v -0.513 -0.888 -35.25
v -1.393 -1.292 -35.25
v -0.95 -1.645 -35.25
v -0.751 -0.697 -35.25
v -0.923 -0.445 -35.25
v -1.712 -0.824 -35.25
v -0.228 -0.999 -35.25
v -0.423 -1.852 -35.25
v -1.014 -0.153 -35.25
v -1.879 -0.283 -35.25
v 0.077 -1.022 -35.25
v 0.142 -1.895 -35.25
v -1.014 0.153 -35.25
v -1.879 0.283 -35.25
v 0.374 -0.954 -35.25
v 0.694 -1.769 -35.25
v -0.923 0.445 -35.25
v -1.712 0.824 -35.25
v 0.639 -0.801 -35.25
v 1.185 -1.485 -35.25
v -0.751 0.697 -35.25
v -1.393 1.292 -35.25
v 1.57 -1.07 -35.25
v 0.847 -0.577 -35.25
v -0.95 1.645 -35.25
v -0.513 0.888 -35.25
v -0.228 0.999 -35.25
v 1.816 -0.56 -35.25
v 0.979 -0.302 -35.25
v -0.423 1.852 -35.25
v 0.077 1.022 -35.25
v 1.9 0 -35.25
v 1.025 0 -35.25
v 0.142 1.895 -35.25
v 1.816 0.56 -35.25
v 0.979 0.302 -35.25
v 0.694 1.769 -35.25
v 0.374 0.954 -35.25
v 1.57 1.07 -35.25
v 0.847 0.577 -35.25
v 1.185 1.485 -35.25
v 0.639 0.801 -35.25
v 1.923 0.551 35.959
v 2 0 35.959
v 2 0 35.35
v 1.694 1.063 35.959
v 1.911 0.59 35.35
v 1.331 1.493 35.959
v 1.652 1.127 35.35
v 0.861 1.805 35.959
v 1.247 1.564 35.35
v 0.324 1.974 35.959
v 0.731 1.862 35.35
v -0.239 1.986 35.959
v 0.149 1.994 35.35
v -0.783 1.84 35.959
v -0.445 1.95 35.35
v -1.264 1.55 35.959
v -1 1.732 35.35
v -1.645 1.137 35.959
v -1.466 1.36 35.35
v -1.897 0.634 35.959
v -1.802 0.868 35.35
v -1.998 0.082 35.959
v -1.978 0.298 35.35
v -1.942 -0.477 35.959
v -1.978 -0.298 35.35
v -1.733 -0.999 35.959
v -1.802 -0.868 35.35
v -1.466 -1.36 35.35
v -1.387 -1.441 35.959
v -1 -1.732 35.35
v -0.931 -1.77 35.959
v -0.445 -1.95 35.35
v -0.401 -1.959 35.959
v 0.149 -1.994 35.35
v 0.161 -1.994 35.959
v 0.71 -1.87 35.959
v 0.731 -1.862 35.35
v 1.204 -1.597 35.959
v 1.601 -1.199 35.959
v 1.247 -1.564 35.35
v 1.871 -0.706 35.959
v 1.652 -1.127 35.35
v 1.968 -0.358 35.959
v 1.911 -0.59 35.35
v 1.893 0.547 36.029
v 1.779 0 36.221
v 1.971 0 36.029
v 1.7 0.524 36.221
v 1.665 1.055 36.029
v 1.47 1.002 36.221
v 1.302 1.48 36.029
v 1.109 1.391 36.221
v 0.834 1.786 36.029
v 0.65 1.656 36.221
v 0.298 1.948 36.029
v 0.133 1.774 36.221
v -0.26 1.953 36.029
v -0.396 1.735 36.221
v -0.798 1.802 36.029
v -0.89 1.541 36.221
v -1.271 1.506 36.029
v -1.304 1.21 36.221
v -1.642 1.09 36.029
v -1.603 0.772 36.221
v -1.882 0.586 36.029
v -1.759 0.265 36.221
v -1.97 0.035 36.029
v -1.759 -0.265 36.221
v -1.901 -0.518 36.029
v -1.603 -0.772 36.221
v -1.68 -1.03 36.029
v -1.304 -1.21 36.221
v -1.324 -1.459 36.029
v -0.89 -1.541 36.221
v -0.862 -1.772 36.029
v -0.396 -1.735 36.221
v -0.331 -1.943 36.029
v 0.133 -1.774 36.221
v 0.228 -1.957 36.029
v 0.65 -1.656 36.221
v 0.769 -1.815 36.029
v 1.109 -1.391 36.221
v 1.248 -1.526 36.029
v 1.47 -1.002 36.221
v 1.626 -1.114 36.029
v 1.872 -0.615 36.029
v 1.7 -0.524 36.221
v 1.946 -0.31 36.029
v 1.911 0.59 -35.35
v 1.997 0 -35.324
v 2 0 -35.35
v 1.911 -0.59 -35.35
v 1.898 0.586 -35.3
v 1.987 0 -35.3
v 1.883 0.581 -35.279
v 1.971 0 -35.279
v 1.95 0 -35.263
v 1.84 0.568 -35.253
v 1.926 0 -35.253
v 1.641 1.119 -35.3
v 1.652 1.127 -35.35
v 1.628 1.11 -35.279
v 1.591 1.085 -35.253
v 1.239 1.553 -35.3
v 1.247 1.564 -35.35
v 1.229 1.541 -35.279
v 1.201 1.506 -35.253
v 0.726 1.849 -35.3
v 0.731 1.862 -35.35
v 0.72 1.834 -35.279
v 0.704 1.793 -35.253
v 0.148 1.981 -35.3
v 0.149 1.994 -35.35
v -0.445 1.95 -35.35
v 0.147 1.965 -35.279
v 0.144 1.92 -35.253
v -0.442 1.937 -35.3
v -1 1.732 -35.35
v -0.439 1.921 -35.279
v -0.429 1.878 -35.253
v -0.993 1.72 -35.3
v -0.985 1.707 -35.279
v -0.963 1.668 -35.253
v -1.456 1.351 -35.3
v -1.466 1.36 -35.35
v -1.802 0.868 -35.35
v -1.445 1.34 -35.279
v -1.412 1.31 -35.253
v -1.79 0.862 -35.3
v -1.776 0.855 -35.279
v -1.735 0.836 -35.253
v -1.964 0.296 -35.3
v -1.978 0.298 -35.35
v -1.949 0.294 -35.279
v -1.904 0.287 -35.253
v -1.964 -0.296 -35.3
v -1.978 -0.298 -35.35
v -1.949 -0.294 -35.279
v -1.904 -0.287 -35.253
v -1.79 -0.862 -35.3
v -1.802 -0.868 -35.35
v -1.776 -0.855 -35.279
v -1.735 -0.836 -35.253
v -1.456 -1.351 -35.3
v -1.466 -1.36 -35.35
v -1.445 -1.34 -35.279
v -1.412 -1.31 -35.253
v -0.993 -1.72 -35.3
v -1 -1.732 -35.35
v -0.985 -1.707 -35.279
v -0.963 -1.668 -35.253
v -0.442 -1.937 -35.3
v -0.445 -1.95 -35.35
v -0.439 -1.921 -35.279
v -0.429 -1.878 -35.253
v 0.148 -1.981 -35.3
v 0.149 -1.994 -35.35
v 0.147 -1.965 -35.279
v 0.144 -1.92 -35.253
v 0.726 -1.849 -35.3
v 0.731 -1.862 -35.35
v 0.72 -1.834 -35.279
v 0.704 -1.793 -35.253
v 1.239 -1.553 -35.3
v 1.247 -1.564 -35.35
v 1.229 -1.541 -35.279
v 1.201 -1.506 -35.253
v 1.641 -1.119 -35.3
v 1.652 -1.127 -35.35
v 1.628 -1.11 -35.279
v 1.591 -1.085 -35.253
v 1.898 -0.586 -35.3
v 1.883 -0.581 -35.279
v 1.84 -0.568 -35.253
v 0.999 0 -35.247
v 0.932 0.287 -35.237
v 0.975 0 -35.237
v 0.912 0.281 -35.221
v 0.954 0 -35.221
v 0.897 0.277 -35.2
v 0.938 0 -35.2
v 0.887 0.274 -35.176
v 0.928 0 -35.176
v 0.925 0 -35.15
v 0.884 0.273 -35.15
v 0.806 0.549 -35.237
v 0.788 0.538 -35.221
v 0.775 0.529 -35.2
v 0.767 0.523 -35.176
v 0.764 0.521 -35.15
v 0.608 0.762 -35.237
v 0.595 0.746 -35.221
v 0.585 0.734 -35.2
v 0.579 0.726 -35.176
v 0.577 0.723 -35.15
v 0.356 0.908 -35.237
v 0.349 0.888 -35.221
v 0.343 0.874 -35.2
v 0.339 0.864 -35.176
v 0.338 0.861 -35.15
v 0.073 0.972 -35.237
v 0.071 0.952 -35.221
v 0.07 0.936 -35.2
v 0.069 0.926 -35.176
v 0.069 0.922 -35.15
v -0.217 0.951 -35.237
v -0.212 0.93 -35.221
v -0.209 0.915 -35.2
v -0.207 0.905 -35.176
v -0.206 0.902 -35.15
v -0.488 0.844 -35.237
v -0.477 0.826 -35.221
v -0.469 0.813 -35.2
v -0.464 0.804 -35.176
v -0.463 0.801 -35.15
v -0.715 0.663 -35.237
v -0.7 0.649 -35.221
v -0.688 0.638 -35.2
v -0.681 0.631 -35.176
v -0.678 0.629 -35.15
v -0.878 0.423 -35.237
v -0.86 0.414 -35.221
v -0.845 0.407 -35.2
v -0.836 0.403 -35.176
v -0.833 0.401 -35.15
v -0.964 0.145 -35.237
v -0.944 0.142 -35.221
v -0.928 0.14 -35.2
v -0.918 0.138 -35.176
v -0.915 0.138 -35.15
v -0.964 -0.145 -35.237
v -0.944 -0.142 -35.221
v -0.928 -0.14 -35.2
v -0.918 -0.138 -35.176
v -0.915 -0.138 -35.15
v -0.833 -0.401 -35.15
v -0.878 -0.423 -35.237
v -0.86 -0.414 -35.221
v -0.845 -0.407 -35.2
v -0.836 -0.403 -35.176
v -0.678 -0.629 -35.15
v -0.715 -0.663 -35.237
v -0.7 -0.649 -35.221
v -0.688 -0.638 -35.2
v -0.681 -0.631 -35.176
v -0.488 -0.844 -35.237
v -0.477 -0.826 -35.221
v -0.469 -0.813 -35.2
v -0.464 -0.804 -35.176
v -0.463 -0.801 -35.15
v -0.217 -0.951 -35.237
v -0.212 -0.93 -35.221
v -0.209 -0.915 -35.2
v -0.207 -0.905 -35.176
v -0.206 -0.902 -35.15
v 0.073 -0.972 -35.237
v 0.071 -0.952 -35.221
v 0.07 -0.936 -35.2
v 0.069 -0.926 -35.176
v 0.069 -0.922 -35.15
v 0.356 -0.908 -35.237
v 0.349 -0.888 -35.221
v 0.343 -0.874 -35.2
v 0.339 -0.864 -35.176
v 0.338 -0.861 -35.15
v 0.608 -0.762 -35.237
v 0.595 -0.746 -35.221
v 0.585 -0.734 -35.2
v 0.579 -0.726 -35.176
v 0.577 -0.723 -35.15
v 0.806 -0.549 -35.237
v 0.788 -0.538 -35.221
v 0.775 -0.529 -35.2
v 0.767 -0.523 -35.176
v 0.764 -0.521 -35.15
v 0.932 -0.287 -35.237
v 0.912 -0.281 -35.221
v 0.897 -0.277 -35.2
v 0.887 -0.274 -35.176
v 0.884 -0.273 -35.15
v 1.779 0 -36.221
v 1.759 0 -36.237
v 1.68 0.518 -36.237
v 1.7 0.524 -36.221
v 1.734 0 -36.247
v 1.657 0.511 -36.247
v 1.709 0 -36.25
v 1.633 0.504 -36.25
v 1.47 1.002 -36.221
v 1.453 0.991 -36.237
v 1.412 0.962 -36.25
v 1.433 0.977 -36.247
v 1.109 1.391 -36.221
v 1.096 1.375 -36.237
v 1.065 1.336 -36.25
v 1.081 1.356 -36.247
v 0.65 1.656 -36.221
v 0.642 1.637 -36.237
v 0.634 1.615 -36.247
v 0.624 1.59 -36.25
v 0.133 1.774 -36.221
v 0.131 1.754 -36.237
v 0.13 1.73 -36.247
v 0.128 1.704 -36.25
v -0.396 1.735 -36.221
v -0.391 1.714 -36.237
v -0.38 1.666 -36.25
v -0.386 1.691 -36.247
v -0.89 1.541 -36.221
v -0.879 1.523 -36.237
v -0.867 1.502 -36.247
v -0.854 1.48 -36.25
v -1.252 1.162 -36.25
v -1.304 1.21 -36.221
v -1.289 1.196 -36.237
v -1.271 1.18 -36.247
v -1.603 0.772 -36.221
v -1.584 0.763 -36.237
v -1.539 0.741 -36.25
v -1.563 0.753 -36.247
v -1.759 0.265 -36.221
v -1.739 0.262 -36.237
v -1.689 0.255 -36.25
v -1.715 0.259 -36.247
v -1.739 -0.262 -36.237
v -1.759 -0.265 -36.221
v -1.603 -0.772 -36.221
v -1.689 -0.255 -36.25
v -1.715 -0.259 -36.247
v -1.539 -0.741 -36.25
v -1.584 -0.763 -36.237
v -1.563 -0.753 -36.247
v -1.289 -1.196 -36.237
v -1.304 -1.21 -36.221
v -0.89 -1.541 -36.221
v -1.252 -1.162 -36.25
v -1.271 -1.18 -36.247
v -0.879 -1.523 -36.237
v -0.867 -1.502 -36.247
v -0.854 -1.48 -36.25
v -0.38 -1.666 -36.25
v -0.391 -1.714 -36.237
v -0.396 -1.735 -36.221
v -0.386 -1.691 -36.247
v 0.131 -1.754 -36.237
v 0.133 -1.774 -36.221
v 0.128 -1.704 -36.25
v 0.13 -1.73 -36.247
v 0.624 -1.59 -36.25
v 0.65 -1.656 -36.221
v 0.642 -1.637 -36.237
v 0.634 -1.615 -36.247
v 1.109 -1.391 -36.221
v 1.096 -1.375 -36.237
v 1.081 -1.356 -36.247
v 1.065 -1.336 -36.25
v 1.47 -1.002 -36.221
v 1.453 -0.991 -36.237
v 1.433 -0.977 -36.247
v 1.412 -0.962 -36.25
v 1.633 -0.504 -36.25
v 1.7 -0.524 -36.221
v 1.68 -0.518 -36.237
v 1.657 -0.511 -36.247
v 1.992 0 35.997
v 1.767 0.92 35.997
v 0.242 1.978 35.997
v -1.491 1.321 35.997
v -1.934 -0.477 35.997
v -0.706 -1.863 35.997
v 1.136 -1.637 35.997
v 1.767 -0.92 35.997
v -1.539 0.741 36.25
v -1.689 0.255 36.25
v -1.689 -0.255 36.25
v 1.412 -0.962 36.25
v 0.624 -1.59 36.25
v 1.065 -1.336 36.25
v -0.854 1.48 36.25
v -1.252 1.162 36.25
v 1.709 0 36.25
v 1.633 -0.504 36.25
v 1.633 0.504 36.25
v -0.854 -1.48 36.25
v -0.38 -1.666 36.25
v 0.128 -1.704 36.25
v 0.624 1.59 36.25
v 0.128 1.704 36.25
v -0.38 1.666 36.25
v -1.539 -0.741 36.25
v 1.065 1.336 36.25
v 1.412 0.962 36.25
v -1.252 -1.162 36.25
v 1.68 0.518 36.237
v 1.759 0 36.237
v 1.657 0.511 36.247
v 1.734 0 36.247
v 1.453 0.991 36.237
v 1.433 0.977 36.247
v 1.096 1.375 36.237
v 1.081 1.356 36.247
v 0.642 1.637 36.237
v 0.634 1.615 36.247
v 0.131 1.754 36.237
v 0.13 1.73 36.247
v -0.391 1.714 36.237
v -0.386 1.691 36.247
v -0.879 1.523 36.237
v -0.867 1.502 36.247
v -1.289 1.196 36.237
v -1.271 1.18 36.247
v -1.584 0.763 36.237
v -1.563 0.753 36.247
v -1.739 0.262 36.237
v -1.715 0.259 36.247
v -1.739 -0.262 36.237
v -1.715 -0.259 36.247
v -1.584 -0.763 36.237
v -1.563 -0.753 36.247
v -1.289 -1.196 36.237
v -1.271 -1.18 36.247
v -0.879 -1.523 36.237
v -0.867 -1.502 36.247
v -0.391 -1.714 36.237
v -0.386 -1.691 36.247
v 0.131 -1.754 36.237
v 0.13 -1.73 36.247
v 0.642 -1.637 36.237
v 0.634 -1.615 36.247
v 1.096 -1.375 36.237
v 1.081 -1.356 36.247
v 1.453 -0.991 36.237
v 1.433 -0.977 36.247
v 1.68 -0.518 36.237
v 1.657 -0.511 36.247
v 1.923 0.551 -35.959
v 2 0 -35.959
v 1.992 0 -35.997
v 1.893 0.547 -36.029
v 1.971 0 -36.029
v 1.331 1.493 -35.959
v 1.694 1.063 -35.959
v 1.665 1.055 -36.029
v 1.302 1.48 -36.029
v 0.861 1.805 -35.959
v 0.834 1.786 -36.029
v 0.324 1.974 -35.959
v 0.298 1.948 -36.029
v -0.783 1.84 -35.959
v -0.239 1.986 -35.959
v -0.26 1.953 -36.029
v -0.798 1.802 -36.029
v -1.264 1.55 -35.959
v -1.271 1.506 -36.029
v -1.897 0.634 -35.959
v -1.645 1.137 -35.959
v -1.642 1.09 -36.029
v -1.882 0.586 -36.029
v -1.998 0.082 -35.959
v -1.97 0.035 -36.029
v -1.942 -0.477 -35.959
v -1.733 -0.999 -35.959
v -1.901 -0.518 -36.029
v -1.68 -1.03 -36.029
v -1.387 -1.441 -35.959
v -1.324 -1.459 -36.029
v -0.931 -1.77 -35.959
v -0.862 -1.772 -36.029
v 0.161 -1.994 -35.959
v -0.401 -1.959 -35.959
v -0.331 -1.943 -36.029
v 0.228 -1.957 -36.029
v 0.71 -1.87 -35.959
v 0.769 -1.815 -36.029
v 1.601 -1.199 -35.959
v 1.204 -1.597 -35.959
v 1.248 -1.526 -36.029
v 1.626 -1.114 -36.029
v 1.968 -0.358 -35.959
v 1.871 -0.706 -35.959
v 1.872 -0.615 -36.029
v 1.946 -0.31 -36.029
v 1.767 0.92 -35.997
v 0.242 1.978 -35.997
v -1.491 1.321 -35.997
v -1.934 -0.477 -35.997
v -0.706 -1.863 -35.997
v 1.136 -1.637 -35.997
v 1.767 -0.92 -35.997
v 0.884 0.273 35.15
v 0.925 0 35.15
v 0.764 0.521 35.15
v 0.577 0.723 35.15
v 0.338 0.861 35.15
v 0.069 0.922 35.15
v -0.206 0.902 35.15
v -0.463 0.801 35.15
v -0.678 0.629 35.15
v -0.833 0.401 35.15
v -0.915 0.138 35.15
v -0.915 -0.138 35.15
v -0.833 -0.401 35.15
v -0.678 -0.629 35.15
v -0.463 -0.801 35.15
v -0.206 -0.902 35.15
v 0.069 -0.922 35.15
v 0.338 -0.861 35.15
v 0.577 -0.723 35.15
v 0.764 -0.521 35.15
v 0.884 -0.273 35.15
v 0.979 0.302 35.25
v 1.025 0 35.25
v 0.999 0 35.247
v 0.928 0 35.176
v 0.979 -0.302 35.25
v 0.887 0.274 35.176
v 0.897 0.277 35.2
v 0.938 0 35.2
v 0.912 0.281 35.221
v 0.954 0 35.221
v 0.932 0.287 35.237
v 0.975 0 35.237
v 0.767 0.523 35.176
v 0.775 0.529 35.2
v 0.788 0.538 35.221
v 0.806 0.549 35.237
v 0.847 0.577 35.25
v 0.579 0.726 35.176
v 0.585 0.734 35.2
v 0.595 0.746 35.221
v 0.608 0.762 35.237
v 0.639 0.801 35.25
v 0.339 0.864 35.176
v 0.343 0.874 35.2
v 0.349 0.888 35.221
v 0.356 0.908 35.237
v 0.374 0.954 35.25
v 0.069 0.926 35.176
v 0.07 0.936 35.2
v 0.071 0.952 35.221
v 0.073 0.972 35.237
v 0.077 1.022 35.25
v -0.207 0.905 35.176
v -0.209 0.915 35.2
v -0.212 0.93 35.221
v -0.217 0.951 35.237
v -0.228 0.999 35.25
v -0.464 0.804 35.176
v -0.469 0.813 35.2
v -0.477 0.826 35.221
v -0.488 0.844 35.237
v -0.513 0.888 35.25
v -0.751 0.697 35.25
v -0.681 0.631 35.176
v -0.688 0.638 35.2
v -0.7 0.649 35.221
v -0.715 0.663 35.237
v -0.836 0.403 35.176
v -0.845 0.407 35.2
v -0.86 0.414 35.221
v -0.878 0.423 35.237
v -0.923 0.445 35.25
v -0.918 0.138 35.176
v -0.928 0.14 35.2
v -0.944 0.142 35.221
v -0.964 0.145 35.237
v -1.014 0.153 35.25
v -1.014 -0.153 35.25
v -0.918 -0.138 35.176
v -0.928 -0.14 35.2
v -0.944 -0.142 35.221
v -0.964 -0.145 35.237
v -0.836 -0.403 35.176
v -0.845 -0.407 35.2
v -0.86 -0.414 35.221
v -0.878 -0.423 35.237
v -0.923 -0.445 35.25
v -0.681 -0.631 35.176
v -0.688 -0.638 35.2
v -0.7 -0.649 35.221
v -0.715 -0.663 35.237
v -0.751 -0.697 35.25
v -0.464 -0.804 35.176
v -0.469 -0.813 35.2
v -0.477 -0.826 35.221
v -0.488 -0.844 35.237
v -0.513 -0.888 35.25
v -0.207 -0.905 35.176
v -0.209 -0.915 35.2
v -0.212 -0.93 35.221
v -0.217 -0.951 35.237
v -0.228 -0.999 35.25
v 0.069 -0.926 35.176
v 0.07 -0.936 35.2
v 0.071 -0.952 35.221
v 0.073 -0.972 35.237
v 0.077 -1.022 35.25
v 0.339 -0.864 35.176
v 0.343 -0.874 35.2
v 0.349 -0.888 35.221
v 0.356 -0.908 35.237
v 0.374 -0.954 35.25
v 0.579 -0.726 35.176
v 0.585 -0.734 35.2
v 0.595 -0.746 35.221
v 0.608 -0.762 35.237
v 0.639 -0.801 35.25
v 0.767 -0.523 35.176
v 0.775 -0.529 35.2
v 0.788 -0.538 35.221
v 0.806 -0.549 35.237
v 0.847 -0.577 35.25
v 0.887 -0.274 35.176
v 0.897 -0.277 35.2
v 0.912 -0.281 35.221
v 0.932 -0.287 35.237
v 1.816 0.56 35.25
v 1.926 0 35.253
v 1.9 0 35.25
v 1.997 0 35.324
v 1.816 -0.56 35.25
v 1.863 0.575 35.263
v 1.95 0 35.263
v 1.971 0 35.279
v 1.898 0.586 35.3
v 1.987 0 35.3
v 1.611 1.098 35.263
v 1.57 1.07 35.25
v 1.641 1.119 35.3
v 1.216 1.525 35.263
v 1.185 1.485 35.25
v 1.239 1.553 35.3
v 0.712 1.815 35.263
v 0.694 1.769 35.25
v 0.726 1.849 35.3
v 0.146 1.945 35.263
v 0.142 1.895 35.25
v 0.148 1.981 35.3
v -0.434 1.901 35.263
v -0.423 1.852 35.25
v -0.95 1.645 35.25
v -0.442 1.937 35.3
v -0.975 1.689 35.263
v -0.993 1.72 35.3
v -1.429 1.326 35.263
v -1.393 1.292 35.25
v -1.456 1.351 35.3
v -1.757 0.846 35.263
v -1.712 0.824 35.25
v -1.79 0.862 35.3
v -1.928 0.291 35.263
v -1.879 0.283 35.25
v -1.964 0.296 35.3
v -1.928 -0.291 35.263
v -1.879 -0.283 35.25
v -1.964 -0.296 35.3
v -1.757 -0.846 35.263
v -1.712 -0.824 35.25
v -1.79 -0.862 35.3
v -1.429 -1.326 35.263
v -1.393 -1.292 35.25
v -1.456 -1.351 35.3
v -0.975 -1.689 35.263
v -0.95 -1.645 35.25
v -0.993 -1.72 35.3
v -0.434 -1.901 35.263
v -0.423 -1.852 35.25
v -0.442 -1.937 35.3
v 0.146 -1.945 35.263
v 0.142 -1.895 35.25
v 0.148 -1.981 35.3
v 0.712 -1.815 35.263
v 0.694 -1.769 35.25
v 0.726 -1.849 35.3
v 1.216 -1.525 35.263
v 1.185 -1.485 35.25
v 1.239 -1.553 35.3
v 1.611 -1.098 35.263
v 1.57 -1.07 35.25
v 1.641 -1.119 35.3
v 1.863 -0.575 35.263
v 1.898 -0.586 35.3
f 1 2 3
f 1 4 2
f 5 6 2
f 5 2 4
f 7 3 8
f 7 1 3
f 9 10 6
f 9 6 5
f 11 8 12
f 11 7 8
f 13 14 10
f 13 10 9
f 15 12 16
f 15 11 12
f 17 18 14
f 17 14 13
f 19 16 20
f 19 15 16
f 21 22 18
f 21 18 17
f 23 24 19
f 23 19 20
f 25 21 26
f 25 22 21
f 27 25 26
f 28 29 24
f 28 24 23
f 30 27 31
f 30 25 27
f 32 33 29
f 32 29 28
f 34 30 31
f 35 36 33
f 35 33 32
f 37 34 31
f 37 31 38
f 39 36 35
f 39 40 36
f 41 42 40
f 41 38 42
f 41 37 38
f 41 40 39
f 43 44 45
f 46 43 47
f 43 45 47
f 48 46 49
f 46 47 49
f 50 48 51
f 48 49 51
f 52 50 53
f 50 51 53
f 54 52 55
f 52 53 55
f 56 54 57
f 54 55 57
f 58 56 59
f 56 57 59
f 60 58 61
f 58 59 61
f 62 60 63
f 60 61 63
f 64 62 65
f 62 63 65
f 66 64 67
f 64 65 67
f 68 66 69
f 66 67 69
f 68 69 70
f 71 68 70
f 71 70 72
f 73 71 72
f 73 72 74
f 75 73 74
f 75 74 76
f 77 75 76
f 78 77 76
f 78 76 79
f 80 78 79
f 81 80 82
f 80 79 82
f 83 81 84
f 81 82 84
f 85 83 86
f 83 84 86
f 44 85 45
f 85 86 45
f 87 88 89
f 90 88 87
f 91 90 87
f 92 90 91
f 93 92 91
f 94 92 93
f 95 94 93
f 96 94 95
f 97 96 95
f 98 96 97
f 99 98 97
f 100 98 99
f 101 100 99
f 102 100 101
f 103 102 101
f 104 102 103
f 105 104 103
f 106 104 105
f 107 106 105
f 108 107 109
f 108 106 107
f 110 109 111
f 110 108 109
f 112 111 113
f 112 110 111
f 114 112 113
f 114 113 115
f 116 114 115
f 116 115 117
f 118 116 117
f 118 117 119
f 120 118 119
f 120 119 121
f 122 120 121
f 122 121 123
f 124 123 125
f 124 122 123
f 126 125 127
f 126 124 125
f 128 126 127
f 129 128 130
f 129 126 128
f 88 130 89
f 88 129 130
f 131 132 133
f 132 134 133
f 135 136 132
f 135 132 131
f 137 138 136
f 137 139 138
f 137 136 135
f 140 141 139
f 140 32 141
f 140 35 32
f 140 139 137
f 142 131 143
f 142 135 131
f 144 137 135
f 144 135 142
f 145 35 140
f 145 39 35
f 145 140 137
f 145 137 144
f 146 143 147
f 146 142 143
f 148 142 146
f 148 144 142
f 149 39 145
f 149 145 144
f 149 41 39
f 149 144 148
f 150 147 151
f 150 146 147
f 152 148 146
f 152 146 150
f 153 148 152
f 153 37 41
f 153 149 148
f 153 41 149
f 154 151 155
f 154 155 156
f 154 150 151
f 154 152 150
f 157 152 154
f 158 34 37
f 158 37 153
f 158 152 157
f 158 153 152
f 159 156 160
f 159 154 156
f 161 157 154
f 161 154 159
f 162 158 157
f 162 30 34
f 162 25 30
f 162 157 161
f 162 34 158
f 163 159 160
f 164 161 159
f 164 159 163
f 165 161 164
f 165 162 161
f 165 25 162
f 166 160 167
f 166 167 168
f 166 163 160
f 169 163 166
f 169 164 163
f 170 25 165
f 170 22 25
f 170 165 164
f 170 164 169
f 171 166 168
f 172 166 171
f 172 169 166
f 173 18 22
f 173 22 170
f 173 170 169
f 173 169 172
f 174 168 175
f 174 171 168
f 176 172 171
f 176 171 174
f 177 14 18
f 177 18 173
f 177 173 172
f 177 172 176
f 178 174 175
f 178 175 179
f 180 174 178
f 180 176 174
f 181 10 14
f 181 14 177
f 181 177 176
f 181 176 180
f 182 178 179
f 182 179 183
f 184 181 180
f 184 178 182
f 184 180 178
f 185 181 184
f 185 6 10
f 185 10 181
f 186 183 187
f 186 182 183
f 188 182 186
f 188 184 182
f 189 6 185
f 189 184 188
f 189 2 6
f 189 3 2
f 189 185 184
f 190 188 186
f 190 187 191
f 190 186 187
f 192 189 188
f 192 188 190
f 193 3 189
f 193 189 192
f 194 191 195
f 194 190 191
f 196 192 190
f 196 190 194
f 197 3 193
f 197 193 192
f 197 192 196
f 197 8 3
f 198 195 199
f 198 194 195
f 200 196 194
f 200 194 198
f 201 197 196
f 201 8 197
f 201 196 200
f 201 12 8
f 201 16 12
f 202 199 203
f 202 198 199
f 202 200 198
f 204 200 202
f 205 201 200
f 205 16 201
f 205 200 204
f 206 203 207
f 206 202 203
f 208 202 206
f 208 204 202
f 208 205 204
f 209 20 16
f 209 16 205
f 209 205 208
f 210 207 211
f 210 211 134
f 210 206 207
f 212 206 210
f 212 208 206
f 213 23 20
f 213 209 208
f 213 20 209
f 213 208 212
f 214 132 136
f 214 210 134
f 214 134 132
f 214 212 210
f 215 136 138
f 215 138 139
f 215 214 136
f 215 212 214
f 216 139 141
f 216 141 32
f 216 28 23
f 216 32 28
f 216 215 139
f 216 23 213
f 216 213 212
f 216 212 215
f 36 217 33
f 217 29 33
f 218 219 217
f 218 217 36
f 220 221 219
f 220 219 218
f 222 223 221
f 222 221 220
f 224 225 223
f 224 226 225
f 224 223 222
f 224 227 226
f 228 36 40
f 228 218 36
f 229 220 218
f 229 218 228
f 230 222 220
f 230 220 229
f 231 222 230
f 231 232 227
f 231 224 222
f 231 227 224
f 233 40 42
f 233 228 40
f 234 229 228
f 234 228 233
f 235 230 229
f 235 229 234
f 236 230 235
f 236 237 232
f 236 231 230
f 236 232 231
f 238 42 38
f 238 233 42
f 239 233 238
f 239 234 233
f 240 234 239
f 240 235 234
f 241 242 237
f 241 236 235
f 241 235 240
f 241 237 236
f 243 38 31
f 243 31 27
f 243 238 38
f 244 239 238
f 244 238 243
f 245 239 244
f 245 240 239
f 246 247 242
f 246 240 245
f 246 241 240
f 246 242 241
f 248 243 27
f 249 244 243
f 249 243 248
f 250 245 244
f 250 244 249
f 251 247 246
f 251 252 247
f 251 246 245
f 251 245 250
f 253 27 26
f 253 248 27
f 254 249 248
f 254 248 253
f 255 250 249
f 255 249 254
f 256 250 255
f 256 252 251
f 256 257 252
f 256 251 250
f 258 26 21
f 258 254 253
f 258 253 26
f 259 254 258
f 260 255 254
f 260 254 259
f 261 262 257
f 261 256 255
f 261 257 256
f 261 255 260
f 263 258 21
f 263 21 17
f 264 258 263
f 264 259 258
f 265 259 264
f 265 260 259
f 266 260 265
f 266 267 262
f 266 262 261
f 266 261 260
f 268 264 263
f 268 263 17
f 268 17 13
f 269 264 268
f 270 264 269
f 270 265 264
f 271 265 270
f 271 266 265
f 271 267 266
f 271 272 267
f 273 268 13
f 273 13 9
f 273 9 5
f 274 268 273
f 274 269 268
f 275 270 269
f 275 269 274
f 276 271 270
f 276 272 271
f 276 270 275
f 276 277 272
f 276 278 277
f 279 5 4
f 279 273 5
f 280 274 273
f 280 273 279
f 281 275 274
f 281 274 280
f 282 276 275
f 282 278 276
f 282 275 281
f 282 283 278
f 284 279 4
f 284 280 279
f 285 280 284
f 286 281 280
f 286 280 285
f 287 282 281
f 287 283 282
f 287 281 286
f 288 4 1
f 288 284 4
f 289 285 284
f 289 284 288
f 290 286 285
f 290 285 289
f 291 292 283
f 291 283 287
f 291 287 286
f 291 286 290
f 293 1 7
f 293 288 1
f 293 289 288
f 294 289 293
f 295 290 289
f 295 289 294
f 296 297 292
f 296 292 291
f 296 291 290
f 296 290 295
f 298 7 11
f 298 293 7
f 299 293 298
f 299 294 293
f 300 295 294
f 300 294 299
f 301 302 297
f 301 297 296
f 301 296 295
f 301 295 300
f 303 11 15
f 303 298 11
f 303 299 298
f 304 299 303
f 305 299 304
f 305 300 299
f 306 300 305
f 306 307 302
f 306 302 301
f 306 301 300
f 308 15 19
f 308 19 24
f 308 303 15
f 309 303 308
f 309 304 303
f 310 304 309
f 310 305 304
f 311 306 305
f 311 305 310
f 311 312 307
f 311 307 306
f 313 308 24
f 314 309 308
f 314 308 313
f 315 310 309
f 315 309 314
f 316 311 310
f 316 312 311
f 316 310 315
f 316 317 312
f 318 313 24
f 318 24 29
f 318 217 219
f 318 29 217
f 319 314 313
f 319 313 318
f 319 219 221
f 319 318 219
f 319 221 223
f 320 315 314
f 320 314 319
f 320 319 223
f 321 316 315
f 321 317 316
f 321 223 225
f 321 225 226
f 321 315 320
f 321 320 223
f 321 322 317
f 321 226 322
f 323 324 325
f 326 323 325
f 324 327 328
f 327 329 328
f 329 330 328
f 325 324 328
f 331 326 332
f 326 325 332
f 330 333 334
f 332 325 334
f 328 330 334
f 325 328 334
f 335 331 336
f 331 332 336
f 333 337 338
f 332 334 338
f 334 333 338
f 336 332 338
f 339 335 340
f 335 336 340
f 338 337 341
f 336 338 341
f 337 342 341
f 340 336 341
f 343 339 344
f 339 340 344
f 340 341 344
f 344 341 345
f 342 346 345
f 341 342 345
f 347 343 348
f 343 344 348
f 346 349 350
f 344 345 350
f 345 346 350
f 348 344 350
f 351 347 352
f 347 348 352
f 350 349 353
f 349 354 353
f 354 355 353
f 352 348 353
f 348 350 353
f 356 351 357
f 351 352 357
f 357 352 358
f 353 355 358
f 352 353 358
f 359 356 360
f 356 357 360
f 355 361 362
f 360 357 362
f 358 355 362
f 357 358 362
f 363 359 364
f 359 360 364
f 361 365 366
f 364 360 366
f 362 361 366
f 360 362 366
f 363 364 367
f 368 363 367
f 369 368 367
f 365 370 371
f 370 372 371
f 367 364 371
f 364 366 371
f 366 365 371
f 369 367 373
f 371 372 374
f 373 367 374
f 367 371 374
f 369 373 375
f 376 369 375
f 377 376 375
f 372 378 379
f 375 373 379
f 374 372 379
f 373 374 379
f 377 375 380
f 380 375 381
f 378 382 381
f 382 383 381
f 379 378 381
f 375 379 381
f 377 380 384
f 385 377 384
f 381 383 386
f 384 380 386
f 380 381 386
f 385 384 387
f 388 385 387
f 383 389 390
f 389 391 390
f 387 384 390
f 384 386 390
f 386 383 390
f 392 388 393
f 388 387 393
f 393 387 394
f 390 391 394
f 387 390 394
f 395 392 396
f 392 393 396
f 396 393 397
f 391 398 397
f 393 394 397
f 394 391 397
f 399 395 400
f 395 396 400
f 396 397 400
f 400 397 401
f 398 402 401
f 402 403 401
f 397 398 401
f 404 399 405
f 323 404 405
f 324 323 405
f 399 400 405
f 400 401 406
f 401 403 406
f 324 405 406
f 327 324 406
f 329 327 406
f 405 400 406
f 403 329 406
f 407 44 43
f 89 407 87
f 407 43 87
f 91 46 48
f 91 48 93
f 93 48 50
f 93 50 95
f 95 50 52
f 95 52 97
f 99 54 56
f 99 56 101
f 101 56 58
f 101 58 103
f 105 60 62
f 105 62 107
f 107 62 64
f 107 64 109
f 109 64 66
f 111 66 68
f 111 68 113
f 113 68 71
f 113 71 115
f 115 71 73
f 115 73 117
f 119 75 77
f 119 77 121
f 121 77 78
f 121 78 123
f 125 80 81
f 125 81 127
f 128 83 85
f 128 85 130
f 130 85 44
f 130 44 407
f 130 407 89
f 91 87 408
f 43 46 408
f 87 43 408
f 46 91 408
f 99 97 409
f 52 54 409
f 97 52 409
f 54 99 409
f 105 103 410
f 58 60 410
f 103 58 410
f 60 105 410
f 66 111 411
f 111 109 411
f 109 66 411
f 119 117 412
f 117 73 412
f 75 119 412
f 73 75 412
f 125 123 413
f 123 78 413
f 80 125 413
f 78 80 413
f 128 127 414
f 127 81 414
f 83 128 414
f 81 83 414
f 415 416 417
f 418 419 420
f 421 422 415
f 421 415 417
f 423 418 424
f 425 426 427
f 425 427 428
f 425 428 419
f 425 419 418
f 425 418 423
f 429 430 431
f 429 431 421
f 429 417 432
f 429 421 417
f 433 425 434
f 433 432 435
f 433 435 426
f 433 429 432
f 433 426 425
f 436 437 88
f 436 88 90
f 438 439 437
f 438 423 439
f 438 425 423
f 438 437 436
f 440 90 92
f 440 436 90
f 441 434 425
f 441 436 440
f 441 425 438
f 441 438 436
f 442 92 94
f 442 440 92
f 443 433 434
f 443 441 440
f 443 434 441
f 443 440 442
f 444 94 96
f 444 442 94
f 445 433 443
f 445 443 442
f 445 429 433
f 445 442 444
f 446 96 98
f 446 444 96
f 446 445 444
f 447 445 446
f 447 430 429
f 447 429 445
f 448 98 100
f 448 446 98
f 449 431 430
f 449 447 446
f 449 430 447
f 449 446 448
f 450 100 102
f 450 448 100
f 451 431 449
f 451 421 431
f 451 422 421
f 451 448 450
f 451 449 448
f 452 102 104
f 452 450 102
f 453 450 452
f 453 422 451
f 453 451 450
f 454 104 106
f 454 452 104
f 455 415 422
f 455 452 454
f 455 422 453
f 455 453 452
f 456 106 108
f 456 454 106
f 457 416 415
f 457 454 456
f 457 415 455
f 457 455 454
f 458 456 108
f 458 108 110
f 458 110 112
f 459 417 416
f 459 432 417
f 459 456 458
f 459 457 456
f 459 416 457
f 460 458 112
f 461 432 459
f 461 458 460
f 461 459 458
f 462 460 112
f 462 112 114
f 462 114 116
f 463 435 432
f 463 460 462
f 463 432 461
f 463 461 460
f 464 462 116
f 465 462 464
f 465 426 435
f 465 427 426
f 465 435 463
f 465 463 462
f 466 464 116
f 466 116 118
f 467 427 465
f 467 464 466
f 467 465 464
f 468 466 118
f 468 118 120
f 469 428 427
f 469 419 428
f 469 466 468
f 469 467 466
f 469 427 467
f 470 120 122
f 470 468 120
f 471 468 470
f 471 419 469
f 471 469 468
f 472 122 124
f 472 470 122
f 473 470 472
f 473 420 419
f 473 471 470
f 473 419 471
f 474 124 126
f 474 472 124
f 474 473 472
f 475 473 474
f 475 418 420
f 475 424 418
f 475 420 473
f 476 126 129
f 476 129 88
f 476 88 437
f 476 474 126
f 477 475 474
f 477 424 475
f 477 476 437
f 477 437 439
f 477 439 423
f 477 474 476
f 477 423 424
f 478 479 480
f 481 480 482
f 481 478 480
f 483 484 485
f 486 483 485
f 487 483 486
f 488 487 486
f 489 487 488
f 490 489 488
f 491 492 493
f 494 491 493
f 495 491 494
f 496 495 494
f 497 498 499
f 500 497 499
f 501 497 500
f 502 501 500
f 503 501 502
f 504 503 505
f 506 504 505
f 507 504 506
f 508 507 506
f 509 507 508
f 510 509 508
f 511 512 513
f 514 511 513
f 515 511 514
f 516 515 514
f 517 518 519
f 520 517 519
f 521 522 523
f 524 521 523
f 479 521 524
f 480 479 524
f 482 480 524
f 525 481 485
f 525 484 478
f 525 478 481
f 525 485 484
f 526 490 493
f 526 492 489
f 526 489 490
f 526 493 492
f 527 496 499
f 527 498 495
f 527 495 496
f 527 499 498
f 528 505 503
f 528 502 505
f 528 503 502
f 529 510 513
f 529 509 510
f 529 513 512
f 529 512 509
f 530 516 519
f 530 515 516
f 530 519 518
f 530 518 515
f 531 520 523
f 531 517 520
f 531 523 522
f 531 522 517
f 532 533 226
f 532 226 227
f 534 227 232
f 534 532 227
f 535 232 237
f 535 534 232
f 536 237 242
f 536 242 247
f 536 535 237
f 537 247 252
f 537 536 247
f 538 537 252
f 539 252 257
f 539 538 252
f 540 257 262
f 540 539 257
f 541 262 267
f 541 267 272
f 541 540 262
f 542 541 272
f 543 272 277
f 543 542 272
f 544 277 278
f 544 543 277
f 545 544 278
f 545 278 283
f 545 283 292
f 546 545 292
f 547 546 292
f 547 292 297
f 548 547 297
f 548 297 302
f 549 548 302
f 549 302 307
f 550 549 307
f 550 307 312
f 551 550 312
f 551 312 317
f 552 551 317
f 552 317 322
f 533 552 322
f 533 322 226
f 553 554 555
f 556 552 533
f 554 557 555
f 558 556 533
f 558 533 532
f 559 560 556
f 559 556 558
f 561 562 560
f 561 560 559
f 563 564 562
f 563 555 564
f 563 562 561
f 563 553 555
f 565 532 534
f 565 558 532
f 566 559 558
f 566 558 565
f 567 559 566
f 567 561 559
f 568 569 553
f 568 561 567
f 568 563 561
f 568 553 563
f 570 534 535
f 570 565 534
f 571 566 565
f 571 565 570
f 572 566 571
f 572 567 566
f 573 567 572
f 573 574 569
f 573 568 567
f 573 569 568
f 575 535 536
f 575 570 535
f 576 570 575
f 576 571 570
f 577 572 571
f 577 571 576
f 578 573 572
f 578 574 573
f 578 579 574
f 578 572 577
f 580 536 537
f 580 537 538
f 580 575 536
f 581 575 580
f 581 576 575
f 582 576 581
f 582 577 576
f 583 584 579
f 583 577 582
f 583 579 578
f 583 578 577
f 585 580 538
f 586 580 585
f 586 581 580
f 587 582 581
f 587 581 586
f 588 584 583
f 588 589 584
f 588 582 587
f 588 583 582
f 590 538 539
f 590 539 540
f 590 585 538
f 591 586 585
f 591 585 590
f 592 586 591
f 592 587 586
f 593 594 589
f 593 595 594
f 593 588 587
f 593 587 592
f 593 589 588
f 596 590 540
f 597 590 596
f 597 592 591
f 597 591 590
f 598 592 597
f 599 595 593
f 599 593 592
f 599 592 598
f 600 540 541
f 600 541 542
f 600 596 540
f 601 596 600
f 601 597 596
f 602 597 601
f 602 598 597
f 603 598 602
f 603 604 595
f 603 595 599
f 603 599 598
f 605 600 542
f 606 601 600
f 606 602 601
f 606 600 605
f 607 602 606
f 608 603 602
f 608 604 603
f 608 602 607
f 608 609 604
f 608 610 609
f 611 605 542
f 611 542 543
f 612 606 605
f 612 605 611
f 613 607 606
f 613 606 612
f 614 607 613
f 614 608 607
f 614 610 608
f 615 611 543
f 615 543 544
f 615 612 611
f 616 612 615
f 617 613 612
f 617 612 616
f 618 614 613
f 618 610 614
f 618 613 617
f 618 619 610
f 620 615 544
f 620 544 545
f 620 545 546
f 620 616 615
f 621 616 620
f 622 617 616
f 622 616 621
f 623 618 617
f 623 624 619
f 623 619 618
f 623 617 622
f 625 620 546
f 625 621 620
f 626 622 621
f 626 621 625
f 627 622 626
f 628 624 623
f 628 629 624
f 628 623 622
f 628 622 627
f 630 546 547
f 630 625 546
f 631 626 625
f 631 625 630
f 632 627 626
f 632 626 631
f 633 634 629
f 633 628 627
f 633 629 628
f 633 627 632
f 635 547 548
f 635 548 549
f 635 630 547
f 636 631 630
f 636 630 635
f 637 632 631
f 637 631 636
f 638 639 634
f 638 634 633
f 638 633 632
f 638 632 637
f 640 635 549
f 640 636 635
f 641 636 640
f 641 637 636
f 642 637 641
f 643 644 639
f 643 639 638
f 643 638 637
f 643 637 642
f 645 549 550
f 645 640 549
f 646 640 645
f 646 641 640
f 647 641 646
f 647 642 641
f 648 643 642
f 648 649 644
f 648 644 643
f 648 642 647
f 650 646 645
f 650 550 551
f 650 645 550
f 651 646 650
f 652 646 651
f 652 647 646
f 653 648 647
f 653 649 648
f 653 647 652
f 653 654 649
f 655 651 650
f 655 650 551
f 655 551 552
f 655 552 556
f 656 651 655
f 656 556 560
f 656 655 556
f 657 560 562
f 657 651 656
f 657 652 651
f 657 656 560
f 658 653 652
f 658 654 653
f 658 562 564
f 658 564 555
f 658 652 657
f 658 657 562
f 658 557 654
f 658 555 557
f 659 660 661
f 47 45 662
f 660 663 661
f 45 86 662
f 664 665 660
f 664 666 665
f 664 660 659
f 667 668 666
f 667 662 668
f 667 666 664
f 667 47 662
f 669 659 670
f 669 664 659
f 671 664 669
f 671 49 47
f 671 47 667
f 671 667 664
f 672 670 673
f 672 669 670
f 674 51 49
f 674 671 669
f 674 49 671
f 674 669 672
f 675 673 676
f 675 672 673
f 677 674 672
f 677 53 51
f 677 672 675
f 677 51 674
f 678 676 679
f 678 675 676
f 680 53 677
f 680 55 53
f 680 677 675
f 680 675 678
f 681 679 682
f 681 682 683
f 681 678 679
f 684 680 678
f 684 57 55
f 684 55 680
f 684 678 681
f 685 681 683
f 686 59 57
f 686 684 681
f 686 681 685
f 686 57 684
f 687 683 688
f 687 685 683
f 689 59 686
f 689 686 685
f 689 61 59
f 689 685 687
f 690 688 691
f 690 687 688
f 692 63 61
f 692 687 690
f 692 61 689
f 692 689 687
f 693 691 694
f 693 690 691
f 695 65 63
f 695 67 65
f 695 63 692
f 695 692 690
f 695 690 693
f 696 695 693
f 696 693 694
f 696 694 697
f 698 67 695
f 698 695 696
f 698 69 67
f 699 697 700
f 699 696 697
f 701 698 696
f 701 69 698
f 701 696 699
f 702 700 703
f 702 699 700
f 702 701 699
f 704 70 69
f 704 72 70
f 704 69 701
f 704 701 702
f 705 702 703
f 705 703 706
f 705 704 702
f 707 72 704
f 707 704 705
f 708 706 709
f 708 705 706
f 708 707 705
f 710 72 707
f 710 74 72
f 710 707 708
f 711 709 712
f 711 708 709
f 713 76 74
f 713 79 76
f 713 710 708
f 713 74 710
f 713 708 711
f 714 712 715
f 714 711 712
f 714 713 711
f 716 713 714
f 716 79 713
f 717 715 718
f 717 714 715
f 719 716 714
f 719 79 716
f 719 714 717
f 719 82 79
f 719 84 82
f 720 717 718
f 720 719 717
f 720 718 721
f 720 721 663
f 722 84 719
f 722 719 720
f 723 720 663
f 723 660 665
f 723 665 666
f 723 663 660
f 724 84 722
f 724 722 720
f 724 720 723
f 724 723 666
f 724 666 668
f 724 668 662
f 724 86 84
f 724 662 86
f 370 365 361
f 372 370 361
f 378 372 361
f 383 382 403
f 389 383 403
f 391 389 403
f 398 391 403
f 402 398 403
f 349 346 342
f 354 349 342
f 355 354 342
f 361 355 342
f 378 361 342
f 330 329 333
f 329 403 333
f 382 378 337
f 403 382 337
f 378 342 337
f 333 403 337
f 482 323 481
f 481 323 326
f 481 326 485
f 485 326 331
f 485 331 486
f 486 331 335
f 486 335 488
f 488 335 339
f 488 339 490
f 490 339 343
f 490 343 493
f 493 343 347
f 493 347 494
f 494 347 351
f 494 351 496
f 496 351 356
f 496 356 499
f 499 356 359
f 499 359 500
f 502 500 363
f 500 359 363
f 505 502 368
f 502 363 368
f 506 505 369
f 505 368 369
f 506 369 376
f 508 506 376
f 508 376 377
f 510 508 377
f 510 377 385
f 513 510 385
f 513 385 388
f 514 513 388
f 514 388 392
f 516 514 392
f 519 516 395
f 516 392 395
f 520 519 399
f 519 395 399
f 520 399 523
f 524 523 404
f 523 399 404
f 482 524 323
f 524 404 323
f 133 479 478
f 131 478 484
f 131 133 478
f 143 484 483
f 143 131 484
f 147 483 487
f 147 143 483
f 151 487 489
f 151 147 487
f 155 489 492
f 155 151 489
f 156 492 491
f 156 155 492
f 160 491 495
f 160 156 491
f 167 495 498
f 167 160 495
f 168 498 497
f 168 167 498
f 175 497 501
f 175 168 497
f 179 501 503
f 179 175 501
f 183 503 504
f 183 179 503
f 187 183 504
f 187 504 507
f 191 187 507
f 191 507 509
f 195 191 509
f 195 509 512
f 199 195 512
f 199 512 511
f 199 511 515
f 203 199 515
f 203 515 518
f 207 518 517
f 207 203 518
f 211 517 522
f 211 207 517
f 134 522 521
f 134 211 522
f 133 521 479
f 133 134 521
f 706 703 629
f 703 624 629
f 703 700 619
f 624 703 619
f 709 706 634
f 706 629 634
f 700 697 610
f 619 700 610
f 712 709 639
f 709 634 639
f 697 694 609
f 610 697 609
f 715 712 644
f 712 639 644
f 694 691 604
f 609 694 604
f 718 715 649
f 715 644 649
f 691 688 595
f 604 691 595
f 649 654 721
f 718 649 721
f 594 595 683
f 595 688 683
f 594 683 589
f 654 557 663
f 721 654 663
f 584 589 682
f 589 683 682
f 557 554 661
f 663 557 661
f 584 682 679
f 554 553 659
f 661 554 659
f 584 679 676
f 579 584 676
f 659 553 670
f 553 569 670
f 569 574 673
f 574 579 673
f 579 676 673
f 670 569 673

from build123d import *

# Parameters (mm, degrees)
SKETCH1_R           = 0.925
BOSS_EXTRUDE1_DEPTH = 35.25
SKETCH2_R           = 2
BOSS_EXTRUDE2_DEPTH = 1
CHAMFER1_SIZE       = 0.25
FILLET1_R           = 0.1


with BuildPart() as part:
    # Sketch1 → Boss-Extrude1 (new body)
    with BuildSketch(Plane.XY):
        Circle(SKETCH1_R)
    extrude(amount=BOSS_EXTRUDE1_DEPTH)

    # Sketch2 → Boss-Extrude2 (add)
    with BuildSketch(Plane.XY.offset(35.25)):
        Circle(SKETCH2_R)
    extrude(amount=BOSS_EXTRUDE2_DEPTH)

    # Chamfer1
    chamfer1_edges = [part.edges().sort_by_distance(p)[0] for p in [
        (-2, 0, 36.25),
    ]]
    chamfer(chamfer1_edges, length=CHAMFER1_SIZE)

    # Mirror1: part across plane


with BuildPart() as part_1:
    add(part.part)
    add(part.part.mirror(Plane.XY))

    # Fillet1
    fillet1_edges = [part_1.edges().sort_by_distance(p)[0] for p in [
        (-1.75, 0, 36.25),
        (-2, 0, 36),
        (-0.925, 0, -35.25),
        (-2, 0, -35.25),
        (-2, 0, -36),
        (-1.75, 0, -36.25),
        (-0.925, 0, 35.25),
        (-2, 0, 35.25),
    ]]
    fillet(fillet1_edges, radius=FILLET1_R)


solid = part_1.part
